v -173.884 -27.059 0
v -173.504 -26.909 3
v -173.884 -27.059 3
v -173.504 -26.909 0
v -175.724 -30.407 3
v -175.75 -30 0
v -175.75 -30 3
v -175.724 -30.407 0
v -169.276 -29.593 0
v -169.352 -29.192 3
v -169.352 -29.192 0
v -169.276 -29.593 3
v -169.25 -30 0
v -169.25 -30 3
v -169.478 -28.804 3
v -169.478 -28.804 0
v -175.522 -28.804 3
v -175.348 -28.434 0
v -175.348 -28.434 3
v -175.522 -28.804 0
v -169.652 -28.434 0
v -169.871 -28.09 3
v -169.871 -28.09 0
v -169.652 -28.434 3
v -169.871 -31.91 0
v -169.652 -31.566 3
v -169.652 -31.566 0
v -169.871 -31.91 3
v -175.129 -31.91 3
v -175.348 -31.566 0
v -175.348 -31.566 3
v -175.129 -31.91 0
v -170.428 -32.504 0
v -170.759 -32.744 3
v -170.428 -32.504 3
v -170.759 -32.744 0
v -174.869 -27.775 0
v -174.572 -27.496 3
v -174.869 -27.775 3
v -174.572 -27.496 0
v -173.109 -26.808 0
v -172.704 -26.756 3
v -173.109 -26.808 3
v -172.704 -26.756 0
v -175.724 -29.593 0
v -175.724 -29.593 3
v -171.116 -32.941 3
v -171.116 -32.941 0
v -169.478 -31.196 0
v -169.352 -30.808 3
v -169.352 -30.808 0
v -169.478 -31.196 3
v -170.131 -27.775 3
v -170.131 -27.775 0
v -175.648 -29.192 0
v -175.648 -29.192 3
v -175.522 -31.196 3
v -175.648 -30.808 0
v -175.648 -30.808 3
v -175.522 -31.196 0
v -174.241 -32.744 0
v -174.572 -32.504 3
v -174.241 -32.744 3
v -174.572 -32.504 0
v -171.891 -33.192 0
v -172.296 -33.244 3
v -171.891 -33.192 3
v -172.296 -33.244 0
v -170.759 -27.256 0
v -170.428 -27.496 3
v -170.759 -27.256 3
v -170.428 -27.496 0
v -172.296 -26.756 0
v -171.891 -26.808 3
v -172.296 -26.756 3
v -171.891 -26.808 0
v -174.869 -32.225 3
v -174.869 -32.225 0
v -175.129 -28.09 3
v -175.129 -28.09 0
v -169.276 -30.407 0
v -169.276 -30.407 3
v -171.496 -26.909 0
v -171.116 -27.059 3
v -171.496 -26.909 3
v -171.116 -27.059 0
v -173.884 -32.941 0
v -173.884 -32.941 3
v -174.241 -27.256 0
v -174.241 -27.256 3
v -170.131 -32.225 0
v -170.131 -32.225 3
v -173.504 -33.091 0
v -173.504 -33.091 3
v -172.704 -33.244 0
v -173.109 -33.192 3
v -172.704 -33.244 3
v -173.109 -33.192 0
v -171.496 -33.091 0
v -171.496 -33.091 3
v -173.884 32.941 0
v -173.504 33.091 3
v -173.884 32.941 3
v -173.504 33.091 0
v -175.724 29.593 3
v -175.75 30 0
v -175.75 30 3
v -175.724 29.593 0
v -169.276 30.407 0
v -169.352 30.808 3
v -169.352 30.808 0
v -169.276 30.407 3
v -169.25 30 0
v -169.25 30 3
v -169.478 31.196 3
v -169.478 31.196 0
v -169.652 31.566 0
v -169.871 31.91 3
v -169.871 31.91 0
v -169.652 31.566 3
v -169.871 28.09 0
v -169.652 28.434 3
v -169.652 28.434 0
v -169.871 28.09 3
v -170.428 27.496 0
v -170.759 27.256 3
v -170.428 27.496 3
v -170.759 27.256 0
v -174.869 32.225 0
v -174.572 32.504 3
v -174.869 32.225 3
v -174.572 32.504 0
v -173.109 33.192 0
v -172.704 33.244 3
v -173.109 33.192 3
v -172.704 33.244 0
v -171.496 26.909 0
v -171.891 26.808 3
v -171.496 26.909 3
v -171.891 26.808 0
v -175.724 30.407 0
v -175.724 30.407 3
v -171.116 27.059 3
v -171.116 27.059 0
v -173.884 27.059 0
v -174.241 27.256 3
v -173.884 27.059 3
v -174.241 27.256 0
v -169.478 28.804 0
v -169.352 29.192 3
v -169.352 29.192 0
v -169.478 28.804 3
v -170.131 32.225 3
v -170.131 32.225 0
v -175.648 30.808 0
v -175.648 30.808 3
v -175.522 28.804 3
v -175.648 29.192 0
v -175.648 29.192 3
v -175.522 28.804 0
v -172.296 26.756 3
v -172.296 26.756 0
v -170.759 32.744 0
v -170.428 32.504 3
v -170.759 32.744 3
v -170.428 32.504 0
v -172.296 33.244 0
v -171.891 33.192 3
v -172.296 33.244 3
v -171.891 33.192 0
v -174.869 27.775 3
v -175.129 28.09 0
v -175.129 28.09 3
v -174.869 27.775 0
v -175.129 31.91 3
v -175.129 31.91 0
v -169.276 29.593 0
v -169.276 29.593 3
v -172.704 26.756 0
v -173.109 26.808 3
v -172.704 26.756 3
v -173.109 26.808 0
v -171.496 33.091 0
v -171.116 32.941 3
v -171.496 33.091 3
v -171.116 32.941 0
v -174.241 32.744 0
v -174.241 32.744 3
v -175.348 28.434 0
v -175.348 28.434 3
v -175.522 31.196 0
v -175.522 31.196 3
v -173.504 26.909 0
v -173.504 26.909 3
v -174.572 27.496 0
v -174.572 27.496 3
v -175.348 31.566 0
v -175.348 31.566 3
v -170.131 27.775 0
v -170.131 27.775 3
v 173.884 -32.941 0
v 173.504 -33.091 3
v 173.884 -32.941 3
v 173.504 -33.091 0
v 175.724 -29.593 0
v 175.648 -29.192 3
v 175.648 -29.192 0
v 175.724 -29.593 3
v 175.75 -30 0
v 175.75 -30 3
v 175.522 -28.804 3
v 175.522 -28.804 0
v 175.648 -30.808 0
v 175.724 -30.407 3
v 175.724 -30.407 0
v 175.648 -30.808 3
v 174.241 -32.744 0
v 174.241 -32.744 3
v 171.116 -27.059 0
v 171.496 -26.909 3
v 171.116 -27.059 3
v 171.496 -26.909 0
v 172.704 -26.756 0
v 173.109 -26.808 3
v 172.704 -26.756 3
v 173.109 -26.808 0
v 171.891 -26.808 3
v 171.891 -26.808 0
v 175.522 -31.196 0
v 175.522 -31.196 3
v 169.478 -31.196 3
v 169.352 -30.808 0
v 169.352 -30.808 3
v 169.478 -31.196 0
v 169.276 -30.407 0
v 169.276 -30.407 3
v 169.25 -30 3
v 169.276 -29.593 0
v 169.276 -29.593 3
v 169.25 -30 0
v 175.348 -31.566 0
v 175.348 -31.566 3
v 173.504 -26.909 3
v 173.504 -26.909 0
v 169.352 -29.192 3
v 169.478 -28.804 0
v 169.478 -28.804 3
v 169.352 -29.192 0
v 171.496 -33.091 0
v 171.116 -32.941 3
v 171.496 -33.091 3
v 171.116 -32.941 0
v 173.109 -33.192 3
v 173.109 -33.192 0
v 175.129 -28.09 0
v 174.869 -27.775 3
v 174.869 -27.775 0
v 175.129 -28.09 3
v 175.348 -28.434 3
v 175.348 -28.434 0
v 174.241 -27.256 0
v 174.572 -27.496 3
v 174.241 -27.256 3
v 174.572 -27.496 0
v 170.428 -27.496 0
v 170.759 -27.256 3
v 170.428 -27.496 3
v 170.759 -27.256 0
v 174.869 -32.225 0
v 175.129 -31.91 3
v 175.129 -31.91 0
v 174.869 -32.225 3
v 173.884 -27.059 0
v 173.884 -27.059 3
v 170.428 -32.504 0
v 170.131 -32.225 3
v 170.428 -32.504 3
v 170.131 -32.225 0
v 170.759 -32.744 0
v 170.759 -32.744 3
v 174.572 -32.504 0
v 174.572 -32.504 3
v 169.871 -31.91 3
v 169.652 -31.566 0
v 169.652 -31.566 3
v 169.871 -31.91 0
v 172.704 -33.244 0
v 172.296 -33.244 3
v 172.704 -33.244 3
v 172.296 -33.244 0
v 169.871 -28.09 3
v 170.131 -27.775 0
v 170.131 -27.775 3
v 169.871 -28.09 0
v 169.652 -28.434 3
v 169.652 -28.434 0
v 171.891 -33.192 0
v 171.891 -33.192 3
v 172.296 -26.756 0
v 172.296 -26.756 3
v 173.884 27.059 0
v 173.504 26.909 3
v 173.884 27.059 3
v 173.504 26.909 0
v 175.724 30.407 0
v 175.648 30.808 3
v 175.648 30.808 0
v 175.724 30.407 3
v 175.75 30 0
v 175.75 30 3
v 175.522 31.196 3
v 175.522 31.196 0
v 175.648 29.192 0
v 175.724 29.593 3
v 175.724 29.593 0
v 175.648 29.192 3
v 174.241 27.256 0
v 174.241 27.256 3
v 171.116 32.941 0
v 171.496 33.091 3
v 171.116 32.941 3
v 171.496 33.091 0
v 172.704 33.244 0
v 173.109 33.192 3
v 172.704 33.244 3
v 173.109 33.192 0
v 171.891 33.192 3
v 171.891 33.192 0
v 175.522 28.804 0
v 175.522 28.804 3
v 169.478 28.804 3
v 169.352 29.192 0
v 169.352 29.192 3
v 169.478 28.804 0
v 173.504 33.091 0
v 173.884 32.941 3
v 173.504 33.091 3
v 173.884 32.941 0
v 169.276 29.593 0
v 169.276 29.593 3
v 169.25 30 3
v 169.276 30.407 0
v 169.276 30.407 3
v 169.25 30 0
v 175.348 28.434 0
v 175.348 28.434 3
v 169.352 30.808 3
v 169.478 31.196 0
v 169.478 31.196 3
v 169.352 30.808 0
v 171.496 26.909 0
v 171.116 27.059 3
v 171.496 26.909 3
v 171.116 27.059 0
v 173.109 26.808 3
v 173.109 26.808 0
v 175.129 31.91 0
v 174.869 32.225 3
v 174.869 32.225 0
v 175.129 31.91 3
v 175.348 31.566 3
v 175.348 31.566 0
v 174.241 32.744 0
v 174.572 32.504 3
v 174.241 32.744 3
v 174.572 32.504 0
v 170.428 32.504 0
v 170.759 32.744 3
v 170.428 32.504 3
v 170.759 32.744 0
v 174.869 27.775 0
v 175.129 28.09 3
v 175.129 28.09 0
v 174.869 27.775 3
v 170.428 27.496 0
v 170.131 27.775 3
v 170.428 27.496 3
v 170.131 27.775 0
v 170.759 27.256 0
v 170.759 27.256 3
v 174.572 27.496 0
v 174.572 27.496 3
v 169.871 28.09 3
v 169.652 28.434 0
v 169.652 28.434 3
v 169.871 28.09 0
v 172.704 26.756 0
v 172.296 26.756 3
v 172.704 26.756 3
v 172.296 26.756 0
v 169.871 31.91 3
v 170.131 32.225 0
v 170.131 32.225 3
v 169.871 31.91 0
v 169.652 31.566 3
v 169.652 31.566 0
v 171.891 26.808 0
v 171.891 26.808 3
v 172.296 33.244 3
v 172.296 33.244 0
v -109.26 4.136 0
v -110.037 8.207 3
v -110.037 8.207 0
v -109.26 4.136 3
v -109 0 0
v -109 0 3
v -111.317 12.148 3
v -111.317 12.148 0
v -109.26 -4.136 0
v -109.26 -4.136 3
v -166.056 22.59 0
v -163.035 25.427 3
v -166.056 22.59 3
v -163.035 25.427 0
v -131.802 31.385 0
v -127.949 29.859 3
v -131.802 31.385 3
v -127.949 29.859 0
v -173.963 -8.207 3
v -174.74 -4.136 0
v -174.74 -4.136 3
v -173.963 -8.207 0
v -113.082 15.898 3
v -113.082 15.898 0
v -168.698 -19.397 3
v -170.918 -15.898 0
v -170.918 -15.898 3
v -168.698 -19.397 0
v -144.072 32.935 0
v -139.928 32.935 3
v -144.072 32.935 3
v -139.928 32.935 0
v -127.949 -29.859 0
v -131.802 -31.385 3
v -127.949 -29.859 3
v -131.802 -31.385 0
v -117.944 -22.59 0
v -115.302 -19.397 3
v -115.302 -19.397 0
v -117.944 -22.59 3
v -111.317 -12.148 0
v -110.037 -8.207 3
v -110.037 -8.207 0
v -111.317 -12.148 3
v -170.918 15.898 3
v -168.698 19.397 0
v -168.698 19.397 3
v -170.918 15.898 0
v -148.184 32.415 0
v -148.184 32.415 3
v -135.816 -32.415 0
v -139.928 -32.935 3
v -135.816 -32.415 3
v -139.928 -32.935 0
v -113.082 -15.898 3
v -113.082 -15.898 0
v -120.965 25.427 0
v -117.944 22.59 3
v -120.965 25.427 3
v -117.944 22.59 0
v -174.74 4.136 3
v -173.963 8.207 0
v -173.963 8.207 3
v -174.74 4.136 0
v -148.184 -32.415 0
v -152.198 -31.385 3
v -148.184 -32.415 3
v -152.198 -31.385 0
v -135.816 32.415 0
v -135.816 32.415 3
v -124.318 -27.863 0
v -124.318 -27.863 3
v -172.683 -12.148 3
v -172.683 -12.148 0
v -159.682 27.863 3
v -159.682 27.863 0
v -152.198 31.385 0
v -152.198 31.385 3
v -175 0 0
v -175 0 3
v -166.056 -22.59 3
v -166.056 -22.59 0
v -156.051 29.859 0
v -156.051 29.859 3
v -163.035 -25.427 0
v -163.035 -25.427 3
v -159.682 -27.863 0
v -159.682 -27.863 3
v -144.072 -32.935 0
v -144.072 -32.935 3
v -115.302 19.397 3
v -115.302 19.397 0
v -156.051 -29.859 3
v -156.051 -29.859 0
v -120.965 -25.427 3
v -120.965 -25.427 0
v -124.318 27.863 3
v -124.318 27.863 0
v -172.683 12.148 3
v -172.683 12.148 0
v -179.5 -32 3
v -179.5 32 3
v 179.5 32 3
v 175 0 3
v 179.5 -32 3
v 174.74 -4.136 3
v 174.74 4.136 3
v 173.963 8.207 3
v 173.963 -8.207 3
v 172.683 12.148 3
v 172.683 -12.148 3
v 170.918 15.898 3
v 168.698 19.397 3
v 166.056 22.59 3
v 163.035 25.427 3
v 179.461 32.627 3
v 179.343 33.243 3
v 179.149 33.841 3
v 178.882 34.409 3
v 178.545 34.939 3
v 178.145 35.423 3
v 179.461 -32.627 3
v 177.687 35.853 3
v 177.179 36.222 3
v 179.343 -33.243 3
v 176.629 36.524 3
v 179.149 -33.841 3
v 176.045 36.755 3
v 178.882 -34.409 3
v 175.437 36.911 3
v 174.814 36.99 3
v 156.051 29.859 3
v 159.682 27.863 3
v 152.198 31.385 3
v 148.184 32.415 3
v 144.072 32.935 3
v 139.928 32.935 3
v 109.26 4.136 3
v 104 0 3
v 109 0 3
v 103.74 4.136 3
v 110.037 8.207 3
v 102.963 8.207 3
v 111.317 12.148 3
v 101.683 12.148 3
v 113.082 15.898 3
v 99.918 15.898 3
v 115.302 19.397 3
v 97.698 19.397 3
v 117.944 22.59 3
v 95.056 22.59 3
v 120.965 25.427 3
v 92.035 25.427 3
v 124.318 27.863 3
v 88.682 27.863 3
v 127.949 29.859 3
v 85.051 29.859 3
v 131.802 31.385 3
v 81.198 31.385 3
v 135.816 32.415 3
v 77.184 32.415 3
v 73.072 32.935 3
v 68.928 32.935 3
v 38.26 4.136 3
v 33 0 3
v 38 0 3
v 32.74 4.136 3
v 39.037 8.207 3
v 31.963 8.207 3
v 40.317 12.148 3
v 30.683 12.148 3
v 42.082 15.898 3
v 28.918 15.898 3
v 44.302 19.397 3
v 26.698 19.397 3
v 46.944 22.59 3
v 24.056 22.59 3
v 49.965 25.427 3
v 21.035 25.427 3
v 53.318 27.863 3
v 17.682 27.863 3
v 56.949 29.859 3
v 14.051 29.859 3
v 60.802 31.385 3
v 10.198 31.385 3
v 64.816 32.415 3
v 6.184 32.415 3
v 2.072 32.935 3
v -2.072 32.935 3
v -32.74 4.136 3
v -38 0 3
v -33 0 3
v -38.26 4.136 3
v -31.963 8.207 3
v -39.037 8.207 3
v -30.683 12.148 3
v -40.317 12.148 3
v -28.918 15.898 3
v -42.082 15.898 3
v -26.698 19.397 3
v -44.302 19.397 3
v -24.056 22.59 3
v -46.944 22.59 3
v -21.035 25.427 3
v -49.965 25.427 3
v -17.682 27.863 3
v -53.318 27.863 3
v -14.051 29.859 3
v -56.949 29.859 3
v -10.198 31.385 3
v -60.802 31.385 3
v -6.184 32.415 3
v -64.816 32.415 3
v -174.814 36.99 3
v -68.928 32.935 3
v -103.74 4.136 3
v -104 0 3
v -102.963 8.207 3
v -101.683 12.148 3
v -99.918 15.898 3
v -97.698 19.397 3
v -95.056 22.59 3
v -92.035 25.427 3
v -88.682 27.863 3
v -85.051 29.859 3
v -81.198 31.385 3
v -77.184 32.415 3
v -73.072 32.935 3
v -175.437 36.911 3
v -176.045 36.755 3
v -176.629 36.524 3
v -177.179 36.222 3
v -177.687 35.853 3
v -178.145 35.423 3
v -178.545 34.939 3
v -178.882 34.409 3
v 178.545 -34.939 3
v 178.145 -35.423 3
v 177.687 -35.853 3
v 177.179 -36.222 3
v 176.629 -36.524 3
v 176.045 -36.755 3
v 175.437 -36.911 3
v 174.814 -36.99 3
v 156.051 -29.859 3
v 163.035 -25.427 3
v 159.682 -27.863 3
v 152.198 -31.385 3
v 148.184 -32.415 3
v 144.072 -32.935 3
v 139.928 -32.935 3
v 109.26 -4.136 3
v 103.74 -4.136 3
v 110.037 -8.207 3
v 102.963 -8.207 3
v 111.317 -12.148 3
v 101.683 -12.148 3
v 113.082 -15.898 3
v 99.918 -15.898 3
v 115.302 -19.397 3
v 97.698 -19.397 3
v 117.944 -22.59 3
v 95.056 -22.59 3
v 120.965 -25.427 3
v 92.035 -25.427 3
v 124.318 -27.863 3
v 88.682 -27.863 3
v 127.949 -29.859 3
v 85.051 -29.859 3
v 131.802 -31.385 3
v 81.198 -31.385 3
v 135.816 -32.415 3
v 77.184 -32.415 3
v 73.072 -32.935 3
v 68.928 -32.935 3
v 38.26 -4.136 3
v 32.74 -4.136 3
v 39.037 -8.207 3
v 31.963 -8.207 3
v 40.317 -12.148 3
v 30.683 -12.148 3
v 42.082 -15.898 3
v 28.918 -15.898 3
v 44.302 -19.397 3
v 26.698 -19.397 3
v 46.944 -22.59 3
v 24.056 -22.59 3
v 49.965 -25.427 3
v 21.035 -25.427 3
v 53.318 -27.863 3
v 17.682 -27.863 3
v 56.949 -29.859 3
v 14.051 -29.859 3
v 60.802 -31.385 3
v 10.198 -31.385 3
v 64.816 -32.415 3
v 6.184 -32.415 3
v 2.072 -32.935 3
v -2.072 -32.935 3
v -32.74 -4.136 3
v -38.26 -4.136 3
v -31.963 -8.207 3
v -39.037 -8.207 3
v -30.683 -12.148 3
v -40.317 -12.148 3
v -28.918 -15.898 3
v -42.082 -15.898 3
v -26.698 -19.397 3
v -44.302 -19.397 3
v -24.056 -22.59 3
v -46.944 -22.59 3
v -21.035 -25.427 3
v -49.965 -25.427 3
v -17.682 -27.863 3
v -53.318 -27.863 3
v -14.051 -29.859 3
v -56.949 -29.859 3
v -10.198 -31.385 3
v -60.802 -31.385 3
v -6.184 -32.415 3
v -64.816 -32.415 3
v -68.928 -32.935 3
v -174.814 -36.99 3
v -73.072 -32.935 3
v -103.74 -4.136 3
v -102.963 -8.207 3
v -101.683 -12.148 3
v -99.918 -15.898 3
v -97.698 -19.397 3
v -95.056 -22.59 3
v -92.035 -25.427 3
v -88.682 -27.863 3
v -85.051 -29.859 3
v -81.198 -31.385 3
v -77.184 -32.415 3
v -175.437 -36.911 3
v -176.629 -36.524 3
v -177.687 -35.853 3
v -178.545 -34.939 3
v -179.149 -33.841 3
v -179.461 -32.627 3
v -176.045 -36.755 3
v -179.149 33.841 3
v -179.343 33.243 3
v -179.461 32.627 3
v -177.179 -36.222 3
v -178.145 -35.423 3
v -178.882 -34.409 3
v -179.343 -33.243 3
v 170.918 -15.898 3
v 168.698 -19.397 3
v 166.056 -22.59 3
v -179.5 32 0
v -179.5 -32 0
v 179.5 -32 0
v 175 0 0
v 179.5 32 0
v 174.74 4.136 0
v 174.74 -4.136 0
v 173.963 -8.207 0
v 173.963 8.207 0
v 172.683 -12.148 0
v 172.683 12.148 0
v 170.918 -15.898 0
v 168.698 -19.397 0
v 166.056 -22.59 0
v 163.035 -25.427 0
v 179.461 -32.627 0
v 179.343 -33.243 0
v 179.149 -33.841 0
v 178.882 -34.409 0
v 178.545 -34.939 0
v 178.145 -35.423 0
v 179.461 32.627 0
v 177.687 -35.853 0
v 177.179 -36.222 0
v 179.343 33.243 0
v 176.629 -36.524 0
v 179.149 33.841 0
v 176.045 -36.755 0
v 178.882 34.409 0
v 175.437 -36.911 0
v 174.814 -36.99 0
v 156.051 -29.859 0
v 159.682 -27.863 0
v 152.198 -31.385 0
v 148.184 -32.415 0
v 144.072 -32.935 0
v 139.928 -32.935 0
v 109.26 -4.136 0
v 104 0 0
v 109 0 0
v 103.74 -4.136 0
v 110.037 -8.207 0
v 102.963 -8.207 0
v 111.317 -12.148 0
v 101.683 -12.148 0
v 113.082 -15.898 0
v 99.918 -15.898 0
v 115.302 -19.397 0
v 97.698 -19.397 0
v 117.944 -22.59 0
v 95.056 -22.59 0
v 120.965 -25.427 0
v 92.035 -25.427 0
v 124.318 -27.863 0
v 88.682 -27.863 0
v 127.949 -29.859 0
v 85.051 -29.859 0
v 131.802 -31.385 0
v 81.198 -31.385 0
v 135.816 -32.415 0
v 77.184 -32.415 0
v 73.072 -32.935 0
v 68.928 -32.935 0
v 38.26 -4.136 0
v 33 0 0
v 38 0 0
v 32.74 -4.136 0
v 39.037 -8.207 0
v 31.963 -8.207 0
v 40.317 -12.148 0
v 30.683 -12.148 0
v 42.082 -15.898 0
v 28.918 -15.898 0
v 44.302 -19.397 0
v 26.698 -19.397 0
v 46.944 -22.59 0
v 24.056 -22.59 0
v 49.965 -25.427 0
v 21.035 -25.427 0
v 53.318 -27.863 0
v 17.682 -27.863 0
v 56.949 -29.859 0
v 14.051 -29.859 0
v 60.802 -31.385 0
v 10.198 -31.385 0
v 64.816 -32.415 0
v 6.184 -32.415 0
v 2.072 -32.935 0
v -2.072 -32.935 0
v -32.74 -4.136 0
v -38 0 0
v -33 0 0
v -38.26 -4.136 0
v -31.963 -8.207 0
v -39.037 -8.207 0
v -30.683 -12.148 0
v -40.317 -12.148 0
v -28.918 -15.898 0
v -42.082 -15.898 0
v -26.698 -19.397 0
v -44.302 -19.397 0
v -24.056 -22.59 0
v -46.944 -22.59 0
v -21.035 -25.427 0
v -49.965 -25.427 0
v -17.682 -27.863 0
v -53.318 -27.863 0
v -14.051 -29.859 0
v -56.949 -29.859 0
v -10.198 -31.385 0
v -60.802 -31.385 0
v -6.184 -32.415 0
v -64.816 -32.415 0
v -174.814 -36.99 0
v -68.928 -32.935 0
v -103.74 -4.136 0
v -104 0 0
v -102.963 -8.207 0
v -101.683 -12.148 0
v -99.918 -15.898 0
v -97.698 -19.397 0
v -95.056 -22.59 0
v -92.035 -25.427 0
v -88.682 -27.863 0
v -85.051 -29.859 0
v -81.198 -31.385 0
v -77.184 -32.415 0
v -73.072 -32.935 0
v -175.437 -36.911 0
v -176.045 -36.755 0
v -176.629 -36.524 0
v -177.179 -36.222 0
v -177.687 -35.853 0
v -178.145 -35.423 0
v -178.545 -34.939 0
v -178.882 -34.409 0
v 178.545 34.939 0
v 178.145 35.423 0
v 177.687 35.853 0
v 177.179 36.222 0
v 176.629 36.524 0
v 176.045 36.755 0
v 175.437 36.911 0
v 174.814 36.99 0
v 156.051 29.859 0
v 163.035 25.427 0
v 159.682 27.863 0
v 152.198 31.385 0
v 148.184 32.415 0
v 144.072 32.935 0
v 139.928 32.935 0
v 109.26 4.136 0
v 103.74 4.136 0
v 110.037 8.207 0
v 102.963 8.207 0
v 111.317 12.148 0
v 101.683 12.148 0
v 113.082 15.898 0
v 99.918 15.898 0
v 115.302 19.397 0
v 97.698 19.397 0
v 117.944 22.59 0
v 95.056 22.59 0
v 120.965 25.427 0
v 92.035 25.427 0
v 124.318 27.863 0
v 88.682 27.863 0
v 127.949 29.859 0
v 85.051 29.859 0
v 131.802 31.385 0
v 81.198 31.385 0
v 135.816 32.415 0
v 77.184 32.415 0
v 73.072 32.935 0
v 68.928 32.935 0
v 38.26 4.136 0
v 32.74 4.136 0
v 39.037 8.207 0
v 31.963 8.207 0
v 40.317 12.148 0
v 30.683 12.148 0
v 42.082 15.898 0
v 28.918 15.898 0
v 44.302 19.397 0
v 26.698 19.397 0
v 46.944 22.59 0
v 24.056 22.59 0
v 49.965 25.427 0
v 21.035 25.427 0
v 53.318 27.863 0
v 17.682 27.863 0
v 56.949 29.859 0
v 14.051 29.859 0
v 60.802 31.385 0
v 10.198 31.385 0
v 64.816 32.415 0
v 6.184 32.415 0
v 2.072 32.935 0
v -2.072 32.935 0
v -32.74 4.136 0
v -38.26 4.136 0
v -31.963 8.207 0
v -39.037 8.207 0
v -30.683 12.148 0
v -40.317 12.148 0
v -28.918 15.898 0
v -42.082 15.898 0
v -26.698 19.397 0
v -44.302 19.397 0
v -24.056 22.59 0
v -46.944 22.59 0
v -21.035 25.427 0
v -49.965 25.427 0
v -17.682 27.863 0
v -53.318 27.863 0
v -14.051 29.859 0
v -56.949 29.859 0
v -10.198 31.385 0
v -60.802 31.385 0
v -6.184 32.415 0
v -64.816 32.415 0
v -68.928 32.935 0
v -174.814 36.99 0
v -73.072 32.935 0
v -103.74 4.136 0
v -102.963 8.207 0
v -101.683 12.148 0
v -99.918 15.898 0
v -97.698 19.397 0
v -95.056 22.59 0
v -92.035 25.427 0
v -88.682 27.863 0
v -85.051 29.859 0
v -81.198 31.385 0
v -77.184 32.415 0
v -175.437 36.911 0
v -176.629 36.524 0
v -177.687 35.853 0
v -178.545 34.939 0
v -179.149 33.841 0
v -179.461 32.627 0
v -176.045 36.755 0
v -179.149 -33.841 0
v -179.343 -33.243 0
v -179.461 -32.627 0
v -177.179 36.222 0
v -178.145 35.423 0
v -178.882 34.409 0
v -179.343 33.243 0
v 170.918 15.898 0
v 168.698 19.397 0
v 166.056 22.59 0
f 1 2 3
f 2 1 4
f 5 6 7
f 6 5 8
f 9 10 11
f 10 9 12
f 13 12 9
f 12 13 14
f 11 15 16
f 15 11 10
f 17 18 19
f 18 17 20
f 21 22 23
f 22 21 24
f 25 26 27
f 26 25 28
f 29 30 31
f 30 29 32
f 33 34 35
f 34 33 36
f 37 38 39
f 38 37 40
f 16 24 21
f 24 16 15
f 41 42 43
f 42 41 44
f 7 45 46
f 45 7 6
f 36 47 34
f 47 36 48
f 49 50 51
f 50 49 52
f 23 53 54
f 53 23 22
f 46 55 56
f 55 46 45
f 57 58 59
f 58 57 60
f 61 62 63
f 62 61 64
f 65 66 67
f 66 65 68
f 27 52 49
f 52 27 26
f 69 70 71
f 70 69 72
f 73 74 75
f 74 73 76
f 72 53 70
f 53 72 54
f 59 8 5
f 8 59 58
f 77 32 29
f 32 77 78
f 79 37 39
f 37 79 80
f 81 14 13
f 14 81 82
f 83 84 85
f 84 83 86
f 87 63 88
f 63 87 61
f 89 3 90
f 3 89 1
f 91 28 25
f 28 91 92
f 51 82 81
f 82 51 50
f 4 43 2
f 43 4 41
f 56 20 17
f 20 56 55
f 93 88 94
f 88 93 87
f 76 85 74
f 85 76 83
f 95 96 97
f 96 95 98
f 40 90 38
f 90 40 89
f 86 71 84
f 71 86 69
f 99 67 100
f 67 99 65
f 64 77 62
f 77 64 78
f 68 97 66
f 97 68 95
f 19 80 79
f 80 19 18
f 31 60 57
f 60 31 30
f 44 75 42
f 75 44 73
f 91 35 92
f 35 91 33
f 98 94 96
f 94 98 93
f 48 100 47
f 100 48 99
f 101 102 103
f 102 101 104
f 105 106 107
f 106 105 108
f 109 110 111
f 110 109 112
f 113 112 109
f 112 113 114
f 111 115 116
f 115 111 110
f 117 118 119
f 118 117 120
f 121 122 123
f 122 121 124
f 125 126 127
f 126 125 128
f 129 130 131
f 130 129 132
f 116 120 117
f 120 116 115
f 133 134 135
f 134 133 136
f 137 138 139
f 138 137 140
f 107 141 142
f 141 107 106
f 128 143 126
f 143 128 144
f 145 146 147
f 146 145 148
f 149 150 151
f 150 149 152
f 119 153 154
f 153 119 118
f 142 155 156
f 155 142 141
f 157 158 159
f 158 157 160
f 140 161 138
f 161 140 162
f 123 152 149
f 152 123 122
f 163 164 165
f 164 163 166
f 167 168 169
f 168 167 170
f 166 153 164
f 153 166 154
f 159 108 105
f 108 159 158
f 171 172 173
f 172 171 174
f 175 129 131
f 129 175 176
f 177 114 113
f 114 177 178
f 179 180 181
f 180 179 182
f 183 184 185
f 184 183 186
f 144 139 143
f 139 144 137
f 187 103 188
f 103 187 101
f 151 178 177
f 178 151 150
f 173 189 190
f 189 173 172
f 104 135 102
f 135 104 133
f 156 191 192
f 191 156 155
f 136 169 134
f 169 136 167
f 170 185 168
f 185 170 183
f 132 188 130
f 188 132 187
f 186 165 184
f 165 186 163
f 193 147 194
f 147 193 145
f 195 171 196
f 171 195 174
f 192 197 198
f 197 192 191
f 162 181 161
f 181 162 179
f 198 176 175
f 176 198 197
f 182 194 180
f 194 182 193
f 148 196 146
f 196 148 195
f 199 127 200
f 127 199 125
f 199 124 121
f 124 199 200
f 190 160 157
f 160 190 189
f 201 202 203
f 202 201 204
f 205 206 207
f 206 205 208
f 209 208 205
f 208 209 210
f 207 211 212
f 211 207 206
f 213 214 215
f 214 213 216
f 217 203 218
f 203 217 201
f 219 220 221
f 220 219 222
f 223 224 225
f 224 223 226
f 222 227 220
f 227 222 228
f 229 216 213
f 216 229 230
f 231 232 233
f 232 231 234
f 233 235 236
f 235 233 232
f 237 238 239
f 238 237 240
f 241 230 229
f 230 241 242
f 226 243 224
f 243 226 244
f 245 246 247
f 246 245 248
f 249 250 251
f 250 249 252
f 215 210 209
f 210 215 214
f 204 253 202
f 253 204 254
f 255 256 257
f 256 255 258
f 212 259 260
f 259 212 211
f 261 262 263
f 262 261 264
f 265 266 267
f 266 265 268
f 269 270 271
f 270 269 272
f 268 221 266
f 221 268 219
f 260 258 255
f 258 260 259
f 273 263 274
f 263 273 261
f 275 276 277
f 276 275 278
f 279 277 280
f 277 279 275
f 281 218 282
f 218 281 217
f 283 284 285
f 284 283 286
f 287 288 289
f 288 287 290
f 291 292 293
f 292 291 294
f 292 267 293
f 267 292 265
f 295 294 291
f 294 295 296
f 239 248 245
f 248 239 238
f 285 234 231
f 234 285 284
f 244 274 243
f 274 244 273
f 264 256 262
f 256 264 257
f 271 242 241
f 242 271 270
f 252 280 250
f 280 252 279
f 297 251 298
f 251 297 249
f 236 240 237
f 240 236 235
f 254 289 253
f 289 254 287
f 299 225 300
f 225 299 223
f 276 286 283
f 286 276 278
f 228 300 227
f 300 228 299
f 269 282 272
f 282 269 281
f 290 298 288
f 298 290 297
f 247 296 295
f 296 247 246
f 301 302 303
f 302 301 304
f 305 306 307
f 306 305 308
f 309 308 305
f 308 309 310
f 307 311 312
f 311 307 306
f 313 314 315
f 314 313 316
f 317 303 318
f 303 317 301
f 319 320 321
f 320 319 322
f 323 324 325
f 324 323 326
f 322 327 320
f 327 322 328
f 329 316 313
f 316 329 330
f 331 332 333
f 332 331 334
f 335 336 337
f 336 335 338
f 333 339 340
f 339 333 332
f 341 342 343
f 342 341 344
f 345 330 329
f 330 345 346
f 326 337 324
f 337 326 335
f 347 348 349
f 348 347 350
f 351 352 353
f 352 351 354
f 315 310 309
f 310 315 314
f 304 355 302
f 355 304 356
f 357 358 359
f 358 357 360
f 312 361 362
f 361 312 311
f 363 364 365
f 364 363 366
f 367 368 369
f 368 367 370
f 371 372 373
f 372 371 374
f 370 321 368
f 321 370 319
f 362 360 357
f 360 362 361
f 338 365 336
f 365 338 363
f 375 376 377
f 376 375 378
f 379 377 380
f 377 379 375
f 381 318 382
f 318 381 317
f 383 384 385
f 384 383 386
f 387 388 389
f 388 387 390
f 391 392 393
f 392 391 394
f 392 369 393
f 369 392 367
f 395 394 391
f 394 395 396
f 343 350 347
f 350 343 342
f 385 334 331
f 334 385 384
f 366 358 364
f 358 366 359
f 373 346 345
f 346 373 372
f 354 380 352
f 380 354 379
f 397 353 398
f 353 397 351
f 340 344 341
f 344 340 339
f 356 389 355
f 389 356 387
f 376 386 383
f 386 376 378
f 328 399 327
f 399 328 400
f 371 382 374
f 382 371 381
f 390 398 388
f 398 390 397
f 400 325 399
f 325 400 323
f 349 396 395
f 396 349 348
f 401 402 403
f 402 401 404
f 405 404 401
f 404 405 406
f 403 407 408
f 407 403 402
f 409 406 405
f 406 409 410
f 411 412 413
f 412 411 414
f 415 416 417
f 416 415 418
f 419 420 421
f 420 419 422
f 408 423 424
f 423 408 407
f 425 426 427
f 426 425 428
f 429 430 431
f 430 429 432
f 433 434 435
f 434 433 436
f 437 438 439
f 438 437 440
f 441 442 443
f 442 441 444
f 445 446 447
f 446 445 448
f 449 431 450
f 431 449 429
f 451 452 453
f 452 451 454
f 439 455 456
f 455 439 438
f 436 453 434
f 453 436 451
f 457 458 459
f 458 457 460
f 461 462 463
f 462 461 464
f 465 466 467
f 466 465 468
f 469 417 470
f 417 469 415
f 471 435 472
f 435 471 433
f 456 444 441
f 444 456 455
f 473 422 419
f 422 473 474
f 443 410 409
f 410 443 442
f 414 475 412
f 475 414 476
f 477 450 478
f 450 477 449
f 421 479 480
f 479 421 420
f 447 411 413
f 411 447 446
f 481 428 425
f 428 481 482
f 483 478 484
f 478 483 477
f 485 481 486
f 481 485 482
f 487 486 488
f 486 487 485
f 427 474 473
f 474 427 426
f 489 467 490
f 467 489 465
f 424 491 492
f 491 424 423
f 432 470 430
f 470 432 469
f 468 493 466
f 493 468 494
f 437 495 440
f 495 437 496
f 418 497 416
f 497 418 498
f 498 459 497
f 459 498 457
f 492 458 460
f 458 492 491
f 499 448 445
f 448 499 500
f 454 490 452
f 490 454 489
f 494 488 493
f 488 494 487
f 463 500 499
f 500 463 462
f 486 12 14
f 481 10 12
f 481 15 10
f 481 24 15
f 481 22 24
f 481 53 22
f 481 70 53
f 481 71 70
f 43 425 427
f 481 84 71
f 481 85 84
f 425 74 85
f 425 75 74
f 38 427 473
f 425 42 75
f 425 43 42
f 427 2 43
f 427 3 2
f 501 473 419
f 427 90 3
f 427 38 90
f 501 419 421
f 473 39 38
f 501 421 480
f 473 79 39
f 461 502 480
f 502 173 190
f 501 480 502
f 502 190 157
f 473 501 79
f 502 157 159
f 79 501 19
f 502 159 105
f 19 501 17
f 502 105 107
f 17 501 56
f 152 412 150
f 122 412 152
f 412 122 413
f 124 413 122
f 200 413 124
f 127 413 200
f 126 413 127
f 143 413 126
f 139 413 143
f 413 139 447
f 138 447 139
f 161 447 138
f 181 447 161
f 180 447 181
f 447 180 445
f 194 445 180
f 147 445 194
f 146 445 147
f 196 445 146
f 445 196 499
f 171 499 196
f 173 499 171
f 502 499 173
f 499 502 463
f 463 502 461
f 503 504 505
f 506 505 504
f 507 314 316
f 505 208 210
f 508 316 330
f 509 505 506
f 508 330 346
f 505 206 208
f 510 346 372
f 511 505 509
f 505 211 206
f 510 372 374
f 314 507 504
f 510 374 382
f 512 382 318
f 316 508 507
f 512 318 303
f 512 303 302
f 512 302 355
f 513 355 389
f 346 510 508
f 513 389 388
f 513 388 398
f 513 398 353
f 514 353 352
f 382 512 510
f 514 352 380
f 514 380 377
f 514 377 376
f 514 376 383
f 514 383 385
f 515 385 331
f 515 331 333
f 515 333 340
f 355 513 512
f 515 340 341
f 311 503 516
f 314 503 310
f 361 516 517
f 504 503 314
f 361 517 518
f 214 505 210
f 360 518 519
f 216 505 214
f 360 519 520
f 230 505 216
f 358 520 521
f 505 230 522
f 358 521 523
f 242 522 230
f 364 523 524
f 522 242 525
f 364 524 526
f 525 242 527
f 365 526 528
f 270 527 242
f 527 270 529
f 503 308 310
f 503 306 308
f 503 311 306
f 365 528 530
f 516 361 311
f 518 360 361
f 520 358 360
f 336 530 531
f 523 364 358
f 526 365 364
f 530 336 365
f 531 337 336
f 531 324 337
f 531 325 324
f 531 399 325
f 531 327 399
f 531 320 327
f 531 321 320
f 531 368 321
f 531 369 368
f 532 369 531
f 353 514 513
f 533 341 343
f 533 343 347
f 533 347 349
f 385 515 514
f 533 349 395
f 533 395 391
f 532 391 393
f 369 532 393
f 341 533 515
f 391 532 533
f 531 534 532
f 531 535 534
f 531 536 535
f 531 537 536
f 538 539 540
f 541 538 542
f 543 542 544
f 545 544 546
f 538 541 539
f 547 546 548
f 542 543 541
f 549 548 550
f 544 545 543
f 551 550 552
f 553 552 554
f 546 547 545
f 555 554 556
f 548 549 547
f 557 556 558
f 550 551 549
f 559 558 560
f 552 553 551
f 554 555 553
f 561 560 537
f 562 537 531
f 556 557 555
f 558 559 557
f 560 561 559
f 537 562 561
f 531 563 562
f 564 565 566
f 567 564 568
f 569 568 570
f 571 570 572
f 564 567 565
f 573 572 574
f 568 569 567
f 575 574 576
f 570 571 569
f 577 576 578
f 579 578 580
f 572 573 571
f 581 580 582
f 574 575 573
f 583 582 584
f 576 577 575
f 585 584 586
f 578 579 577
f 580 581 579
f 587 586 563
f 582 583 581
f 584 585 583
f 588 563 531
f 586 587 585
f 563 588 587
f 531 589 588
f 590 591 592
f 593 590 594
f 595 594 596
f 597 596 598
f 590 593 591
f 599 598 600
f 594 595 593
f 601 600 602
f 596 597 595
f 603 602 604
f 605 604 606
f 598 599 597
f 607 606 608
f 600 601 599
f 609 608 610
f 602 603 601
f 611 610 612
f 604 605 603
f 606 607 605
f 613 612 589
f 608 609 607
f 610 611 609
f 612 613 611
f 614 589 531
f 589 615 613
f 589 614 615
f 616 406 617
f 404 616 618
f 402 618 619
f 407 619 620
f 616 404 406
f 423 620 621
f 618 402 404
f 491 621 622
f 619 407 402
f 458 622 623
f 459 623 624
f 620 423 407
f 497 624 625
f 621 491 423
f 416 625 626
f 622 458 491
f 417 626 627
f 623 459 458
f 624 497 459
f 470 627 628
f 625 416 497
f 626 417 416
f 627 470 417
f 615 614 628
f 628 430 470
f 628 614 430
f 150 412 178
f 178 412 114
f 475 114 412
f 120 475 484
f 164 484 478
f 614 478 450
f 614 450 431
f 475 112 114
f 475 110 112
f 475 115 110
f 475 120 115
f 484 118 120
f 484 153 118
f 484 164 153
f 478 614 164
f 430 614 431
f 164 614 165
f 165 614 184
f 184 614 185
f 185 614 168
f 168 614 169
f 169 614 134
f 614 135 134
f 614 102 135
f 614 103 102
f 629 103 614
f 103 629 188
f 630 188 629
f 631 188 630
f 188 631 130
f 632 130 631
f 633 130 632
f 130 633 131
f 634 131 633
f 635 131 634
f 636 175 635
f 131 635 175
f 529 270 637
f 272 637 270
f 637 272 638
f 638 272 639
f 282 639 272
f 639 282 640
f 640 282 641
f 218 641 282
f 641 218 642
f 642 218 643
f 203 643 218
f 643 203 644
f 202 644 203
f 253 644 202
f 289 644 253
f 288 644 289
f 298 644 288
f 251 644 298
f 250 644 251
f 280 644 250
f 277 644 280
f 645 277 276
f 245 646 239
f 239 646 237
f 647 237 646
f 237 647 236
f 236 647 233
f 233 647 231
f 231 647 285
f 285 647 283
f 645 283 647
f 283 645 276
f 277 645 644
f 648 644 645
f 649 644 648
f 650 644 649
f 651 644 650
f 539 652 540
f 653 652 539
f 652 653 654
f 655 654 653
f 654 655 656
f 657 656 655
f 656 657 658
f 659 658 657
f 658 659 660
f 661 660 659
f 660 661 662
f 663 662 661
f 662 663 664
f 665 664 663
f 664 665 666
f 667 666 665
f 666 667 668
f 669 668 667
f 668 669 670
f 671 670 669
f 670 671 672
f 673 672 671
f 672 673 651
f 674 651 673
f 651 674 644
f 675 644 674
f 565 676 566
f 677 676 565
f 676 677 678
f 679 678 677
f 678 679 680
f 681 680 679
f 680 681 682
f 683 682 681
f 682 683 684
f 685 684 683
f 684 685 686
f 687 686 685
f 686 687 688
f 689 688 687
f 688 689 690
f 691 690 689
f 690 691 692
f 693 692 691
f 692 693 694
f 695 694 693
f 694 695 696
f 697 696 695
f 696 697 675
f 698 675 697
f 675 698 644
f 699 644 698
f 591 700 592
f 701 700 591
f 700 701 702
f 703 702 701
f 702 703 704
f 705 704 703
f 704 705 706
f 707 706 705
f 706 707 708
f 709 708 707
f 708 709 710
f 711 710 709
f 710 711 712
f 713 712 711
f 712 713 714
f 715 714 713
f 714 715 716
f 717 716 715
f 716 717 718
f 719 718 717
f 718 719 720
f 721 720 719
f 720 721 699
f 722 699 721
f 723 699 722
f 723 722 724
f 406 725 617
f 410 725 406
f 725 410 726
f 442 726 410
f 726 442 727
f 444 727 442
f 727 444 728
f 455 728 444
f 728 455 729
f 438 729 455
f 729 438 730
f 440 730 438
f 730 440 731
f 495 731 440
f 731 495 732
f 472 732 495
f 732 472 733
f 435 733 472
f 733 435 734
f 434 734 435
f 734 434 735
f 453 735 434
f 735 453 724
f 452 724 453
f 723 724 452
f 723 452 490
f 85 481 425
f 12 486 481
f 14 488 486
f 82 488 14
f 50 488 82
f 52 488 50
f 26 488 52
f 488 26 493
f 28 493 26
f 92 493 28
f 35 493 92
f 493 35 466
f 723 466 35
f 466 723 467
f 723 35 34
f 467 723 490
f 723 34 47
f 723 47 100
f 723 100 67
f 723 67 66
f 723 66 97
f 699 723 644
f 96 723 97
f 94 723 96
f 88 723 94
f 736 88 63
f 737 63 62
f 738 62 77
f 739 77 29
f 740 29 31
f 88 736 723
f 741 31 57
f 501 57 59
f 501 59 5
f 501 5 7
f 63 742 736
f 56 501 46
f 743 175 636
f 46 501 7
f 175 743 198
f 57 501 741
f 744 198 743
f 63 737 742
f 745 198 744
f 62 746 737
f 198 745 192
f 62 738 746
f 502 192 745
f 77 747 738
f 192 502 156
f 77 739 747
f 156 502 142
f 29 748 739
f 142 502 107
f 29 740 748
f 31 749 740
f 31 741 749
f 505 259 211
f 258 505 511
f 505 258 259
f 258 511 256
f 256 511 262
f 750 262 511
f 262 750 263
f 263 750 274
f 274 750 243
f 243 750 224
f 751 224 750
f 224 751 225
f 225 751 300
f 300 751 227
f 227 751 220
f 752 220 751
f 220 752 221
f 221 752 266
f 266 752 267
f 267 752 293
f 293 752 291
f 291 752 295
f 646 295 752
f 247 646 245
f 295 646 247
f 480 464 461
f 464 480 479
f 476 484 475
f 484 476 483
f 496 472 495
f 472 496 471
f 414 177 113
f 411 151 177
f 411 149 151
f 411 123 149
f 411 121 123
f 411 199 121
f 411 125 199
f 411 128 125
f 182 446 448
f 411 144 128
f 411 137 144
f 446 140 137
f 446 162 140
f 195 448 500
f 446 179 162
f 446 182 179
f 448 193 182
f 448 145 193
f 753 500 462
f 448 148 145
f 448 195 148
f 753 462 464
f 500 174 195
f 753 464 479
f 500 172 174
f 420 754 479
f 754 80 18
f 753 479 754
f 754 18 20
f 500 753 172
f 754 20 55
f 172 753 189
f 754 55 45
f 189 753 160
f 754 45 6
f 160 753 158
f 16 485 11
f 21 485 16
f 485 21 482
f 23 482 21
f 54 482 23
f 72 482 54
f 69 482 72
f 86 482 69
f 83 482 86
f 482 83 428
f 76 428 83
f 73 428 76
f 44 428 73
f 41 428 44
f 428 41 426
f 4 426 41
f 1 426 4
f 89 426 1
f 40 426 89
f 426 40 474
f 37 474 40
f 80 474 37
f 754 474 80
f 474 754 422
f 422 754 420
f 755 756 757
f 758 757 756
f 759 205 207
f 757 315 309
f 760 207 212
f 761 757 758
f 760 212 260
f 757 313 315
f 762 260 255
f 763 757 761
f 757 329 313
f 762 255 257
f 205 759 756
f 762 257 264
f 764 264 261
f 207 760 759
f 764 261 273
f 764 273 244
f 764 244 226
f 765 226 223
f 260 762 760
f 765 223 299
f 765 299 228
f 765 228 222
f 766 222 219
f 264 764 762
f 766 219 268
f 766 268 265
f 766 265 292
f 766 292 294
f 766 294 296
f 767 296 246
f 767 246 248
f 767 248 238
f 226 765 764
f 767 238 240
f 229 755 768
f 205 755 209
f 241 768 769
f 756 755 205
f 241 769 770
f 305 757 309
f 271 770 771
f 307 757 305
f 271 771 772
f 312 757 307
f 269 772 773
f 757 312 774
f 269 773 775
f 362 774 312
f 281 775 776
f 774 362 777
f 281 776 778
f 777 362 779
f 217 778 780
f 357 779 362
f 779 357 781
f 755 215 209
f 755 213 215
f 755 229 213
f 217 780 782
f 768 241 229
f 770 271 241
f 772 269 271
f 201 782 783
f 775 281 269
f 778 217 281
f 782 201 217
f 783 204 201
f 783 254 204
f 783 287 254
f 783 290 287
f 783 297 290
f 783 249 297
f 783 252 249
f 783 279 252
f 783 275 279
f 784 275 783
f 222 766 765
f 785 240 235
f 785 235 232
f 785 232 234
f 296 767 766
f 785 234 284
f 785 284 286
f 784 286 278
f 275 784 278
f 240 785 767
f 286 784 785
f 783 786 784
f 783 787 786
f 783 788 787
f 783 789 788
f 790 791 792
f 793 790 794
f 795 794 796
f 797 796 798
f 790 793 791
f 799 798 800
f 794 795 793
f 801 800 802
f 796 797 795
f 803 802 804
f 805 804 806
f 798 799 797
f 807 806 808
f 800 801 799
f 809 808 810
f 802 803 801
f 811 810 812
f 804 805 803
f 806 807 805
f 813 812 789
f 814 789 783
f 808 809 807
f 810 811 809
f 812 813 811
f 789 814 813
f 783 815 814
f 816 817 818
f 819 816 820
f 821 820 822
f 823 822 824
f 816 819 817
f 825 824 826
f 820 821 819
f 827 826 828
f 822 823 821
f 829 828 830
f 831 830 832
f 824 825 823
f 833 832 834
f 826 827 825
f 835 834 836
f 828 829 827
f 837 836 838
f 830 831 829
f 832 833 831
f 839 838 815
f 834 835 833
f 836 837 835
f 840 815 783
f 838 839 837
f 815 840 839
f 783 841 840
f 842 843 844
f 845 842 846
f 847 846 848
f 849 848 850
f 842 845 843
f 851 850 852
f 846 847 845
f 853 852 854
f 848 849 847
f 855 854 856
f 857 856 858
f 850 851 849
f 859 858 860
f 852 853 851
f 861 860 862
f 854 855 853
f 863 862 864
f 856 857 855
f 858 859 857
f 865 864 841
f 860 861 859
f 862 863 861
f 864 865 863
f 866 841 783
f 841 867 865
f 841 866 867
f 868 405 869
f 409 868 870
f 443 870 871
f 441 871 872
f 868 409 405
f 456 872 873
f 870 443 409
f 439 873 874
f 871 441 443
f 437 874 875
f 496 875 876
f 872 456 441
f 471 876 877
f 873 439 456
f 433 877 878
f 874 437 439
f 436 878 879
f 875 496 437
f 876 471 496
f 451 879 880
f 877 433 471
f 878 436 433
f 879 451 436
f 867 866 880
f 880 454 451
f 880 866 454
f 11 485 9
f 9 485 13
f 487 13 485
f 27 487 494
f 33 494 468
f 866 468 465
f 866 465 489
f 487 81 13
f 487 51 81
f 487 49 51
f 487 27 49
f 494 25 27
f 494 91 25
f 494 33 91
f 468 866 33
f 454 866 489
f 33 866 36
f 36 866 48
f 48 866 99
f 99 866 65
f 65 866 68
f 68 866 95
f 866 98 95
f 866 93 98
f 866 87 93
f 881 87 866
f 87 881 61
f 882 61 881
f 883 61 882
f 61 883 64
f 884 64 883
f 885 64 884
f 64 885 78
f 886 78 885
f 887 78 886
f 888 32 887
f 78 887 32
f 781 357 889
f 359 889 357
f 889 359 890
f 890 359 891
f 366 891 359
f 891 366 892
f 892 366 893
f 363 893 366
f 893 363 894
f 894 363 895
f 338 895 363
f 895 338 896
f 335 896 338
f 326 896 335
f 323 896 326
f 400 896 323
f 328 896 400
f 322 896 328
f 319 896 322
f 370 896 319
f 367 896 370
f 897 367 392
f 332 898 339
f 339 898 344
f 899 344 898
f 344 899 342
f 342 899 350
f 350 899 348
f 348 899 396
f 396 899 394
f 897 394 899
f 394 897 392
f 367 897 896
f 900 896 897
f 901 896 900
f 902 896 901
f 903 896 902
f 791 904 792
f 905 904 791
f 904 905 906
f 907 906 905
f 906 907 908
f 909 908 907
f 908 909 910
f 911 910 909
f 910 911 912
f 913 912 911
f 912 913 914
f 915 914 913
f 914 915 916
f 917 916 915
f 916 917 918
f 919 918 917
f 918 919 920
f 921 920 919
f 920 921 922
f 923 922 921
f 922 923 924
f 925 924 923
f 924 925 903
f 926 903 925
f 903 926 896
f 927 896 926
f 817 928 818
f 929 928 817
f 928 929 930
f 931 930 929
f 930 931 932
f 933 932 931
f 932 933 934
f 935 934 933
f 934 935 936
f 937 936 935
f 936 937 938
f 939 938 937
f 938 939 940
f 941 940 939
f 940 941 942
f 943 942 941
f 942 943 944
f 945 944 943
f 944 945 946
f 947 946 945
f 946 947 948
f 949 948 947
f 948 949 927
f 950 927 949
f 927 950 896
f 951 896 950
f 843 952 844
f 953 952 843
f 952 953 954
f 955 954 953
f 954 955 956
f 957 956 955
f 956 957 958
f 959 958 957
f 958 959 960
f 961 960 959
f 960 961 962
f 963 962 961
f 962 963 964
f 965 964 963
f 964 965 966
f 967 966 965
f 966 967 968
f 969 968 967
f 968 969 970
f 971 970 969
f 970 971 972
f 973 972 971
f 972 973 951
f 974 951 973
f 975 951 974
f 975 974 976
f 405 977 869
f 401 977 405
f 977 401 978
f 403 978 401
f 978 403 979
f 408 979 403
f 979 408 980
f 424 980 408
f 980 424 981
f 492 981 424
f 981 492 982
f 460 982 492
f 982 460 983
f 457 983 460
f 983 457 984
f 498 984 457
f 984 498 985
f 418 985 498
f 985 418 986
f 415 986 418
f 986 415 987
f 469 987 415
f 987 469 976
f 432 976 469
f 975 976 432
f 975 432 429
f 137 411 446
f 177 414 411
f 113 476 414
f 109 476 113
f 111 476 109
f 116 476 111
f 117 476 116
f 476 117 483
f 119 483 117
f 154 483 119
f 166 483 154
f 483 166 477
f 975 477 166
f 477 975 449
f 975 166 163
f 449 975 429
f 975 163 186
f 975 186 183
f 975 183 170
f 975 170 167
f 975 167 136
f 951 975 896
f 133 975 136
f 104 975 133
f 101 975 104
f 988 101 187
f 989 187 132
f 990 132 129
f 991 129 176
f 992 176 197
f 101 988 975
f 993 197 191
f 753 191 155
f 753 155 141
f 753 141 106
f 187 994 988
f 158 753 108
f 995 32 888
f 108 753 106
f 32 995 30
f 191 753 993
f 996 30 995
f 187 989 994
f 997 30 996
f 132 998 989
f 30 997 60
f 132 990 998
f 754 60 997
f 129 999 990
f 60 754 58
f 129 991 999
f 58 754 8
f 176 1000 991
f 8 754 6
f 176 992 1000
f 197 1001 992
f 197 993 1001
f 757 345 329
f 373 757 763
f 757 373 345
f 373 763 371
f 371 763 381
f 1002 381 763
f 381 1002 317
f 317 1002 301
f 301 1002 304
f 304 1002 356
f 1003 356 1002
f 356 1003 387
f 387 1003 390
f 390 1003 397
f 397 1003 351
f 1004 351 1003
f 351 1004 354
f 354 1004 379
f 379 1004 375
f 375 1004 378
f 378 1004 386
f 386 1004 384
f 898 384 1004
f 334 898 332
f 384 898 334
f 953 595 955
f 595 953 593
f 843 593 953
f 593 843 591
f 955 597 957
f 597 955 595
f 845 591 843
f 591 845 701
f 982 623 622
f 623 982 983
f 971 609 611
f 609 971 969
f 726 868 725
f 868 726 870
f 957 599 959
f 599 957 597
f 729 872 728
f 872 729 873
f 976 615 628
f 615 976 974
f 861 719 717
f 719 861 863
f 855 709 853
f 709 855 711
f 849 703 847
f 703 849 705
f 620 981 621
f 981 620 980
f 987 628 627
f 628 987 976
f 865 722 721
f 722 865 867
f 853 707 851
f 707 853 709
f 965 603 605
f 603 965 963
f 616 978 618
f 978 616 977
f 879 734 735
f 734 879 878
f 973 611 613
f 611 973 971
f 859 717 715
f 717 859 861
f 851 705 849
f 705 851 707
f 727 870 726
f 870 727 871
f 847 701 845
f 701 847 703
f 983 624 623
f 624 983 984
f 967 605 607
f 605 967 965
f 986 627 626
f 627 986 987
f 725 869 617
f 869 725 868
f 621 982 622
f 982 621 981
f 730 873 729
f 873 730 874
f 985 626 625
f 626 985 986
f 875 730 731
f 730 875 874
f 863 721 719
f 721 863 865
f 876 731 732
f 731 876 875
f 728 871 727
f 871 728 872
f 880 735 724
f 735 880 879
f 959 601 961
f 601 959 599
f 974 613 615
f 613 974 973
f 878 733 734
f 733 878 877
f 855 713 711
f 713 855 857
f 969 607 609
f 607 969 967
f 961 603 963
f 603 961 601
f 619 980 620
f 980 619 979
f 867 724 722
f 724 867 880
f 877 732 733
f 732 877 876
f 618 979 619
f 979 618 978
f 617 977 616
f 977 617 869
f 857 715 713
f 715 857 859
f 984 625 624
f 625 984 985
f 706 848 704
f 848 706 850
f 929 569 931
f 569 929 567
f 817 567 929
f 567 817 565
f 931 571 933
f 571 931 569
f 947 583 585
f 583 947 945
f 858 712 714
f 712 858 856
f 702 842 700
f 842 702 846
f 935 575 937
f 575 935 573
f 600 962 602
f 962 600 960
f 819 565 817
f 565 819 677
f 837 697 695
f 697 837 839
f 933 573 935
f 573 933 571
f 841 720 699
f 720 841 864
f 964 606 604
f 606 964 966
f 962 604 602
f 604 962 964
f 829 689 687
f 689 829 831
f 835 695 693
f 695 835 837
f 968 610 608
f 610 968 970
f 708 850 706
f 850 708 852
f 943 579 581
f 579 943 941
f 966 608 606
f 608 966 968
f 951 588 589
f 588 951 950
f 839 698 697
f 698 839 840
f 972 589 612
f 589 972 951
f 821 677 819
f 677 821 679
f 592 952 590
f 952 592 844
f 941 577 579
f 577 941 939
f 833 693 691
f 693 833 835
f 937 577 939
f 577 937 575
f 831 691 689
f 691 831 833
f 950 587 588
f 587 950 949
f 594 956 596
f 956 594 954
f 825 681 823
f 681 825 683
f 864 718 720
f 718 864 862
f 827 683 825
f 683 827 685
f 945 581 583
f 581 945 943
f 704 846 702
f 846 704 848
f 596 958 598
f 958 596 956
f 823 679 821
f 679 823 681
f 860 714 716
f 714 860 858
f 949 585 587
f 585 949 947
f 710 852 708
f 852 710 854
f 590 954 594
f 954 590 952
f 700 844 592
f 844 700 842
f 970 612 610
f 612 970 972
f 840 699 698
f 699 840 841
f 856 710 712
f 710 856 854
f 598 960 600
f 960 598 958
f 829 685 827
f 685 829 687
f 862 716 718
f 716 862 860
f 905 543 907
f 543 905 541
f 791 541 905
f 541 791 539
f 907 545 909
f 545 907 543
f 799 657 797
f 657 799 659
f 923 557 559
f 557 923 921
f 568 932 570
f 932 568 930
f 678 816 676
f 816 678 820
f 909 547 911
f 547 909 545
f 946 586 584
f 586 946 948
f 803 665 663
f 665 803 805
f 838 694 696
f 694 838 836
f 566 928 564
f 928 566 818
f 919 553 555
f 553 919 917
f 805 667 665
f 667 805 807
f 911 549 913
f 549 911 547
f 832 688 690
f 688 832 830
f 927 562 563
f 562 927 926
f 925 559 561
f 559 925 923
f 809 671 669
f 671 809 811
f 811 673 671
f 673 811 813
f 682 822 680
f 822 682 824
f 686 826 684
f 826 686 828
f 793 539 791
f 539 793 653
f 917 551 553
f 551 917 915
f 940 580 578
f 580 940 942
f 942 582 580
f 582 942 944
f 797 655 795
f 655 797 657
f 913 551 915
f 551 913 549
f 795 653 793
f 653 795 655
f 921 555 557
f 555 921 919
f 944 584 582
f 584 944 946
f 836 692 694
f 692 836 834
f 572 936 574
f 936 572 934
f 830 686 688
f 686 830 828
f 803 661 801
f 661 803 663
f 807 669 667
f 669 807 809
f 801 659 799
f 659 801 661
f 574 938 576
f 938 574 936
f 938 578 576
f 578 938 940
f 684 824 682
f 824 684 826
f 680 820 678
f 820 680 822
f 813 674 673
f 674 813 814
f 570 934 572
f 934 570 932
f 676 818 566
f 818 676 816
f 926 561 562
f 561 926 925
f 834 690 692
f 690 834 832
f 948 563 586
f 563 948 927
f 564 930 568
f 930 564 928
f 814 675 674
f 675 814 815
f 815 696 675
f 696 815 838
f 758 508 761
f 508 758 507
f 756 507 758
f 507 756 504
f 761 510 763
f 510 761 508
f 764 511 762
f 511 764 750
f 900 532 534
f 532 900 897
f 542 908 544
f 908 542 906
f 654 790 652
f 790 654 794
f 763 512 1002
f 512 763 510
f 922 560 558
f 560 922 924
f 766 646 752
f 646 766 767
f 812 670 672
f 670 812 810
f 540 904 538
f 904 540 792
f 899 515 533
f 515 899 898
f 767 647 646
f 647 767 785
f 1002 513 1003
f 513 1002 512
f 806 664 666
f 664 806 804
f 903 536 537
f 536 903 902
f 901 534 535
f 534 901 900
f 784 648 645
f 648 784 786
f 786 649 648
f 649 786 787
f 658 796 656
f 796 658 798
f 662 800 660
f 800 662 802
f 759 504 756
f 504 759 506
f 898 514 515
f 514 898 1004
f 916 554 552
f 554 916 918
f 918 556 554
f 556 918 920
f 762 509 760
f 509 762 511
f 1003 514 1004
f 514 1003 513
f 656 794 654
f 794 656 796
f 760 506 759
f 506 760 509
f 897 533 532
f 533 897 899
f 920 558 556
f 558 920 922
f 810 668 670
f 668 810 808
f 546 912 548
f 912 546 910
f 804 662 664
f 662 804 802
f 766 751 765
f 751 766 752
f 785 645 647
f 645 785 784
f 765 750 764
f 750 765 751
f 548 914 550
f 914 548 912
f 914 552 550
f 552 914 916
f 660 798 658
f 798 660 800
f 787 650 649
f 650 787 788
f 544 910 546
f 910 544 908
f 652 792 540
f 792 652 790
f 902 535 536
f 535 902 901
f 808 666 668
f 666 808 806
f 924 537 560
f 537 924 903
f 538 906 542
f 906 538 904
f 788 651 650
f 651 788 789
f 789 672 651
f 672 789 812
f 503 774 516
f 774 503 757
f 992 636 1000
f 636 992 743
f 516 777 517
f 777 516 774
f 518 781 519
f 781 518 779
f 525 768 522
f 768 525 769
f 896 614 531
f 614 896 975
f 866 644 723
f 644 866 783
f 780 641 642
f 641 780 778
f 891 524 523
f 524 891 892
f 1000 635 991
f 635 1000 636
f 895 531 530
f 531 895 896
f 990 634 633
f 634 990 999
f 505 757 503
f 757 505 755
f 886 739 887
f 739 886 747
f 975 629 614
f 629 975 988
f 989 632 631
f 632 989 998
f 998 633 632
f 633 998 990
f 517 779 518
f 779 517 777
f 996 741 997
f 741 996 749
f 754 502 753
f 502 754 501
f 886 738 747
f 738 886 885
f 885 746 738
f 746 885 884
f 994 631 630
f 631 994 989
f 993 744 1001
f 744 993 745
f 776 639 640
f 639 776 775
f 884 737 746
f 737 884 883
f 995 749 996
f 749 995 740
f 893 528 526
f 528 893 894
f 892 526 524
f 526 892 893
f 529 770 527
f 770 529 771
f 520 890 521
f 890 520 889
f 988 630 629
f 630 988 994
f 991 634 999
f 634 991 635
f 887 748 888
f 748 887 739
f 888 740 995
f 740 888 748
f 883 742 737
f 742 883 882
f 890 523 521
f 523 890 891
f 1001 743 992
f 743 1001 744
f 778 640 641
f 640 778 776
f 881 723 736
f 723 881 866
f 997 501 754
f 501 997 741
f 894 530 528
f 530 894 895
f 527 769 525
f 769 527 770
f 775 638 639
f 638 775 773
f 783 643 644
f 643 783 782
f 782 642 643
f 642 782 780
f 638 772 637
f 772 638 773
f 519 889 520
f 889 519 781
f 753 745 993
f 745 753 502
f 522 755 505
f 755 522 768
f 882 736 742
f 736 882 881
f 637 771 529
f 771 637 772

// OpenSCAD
$fn = 50;


difference() {
	union() {
		hull() {
			translate(v = [-174.5000000000, 32.0000000000, 0]) {
				cylinder(h = 3, r = 5);
			}
			translate(v = [174.5000000000, 32.0000000000, 0]) {
				cylinder(h = 3, r = 5);
			}
			translate(v = [-174.5000000000, -32.0000000000, 0]) {
				cylinder(h = 3, r = 5);
			}
			translate(v = [174.5000000000, -32.0000000000, 0]) {
				cylinder(h = 3, r = 5);
			}
		}
	}
	union() {
		#translate(v = [-172.5000000000, -30.0000000000, -100.0000000000]) {
			cylinder(h = 200, r = 3.2500000000);
		}
		#translate(v = [-172.5000000000, 30.0000000000, -100.0000000000]) {
			cylinder(h = 200, r = 3.2500000000);
		}
		#translate(v = [172.5000000000, -30.0000000000, -100.0000000000]) {
			cylinder(h = 200, r = 3.2500000000);
		}
		#translate(v = [172.5000000000, 30.0000000000, -100.0000000000]) {
			cylinder(h = 200, r = 3.2500000000);
		}
		#translate(v = [-142.0000000000, 0, 0]) {
			cylinder(h = 3, r = 33.0000000000);
		}
		#translate(v = [-71.0000000000, 0, 0]) {
			cylinder(h = 3, r = 33.0000000000);
		}
		#cylinder(h = 3, r = 33.0000000000);
		#translate(v = [71.0000000000, 0, 0]) {
			cylinder(h = 3, r = 33.0000000000);
		}
		#translate(v = [142.0000000000, 0, 0]) {
			cylinder(h = 3, r = 33.0000000000);
		}
	}
}
